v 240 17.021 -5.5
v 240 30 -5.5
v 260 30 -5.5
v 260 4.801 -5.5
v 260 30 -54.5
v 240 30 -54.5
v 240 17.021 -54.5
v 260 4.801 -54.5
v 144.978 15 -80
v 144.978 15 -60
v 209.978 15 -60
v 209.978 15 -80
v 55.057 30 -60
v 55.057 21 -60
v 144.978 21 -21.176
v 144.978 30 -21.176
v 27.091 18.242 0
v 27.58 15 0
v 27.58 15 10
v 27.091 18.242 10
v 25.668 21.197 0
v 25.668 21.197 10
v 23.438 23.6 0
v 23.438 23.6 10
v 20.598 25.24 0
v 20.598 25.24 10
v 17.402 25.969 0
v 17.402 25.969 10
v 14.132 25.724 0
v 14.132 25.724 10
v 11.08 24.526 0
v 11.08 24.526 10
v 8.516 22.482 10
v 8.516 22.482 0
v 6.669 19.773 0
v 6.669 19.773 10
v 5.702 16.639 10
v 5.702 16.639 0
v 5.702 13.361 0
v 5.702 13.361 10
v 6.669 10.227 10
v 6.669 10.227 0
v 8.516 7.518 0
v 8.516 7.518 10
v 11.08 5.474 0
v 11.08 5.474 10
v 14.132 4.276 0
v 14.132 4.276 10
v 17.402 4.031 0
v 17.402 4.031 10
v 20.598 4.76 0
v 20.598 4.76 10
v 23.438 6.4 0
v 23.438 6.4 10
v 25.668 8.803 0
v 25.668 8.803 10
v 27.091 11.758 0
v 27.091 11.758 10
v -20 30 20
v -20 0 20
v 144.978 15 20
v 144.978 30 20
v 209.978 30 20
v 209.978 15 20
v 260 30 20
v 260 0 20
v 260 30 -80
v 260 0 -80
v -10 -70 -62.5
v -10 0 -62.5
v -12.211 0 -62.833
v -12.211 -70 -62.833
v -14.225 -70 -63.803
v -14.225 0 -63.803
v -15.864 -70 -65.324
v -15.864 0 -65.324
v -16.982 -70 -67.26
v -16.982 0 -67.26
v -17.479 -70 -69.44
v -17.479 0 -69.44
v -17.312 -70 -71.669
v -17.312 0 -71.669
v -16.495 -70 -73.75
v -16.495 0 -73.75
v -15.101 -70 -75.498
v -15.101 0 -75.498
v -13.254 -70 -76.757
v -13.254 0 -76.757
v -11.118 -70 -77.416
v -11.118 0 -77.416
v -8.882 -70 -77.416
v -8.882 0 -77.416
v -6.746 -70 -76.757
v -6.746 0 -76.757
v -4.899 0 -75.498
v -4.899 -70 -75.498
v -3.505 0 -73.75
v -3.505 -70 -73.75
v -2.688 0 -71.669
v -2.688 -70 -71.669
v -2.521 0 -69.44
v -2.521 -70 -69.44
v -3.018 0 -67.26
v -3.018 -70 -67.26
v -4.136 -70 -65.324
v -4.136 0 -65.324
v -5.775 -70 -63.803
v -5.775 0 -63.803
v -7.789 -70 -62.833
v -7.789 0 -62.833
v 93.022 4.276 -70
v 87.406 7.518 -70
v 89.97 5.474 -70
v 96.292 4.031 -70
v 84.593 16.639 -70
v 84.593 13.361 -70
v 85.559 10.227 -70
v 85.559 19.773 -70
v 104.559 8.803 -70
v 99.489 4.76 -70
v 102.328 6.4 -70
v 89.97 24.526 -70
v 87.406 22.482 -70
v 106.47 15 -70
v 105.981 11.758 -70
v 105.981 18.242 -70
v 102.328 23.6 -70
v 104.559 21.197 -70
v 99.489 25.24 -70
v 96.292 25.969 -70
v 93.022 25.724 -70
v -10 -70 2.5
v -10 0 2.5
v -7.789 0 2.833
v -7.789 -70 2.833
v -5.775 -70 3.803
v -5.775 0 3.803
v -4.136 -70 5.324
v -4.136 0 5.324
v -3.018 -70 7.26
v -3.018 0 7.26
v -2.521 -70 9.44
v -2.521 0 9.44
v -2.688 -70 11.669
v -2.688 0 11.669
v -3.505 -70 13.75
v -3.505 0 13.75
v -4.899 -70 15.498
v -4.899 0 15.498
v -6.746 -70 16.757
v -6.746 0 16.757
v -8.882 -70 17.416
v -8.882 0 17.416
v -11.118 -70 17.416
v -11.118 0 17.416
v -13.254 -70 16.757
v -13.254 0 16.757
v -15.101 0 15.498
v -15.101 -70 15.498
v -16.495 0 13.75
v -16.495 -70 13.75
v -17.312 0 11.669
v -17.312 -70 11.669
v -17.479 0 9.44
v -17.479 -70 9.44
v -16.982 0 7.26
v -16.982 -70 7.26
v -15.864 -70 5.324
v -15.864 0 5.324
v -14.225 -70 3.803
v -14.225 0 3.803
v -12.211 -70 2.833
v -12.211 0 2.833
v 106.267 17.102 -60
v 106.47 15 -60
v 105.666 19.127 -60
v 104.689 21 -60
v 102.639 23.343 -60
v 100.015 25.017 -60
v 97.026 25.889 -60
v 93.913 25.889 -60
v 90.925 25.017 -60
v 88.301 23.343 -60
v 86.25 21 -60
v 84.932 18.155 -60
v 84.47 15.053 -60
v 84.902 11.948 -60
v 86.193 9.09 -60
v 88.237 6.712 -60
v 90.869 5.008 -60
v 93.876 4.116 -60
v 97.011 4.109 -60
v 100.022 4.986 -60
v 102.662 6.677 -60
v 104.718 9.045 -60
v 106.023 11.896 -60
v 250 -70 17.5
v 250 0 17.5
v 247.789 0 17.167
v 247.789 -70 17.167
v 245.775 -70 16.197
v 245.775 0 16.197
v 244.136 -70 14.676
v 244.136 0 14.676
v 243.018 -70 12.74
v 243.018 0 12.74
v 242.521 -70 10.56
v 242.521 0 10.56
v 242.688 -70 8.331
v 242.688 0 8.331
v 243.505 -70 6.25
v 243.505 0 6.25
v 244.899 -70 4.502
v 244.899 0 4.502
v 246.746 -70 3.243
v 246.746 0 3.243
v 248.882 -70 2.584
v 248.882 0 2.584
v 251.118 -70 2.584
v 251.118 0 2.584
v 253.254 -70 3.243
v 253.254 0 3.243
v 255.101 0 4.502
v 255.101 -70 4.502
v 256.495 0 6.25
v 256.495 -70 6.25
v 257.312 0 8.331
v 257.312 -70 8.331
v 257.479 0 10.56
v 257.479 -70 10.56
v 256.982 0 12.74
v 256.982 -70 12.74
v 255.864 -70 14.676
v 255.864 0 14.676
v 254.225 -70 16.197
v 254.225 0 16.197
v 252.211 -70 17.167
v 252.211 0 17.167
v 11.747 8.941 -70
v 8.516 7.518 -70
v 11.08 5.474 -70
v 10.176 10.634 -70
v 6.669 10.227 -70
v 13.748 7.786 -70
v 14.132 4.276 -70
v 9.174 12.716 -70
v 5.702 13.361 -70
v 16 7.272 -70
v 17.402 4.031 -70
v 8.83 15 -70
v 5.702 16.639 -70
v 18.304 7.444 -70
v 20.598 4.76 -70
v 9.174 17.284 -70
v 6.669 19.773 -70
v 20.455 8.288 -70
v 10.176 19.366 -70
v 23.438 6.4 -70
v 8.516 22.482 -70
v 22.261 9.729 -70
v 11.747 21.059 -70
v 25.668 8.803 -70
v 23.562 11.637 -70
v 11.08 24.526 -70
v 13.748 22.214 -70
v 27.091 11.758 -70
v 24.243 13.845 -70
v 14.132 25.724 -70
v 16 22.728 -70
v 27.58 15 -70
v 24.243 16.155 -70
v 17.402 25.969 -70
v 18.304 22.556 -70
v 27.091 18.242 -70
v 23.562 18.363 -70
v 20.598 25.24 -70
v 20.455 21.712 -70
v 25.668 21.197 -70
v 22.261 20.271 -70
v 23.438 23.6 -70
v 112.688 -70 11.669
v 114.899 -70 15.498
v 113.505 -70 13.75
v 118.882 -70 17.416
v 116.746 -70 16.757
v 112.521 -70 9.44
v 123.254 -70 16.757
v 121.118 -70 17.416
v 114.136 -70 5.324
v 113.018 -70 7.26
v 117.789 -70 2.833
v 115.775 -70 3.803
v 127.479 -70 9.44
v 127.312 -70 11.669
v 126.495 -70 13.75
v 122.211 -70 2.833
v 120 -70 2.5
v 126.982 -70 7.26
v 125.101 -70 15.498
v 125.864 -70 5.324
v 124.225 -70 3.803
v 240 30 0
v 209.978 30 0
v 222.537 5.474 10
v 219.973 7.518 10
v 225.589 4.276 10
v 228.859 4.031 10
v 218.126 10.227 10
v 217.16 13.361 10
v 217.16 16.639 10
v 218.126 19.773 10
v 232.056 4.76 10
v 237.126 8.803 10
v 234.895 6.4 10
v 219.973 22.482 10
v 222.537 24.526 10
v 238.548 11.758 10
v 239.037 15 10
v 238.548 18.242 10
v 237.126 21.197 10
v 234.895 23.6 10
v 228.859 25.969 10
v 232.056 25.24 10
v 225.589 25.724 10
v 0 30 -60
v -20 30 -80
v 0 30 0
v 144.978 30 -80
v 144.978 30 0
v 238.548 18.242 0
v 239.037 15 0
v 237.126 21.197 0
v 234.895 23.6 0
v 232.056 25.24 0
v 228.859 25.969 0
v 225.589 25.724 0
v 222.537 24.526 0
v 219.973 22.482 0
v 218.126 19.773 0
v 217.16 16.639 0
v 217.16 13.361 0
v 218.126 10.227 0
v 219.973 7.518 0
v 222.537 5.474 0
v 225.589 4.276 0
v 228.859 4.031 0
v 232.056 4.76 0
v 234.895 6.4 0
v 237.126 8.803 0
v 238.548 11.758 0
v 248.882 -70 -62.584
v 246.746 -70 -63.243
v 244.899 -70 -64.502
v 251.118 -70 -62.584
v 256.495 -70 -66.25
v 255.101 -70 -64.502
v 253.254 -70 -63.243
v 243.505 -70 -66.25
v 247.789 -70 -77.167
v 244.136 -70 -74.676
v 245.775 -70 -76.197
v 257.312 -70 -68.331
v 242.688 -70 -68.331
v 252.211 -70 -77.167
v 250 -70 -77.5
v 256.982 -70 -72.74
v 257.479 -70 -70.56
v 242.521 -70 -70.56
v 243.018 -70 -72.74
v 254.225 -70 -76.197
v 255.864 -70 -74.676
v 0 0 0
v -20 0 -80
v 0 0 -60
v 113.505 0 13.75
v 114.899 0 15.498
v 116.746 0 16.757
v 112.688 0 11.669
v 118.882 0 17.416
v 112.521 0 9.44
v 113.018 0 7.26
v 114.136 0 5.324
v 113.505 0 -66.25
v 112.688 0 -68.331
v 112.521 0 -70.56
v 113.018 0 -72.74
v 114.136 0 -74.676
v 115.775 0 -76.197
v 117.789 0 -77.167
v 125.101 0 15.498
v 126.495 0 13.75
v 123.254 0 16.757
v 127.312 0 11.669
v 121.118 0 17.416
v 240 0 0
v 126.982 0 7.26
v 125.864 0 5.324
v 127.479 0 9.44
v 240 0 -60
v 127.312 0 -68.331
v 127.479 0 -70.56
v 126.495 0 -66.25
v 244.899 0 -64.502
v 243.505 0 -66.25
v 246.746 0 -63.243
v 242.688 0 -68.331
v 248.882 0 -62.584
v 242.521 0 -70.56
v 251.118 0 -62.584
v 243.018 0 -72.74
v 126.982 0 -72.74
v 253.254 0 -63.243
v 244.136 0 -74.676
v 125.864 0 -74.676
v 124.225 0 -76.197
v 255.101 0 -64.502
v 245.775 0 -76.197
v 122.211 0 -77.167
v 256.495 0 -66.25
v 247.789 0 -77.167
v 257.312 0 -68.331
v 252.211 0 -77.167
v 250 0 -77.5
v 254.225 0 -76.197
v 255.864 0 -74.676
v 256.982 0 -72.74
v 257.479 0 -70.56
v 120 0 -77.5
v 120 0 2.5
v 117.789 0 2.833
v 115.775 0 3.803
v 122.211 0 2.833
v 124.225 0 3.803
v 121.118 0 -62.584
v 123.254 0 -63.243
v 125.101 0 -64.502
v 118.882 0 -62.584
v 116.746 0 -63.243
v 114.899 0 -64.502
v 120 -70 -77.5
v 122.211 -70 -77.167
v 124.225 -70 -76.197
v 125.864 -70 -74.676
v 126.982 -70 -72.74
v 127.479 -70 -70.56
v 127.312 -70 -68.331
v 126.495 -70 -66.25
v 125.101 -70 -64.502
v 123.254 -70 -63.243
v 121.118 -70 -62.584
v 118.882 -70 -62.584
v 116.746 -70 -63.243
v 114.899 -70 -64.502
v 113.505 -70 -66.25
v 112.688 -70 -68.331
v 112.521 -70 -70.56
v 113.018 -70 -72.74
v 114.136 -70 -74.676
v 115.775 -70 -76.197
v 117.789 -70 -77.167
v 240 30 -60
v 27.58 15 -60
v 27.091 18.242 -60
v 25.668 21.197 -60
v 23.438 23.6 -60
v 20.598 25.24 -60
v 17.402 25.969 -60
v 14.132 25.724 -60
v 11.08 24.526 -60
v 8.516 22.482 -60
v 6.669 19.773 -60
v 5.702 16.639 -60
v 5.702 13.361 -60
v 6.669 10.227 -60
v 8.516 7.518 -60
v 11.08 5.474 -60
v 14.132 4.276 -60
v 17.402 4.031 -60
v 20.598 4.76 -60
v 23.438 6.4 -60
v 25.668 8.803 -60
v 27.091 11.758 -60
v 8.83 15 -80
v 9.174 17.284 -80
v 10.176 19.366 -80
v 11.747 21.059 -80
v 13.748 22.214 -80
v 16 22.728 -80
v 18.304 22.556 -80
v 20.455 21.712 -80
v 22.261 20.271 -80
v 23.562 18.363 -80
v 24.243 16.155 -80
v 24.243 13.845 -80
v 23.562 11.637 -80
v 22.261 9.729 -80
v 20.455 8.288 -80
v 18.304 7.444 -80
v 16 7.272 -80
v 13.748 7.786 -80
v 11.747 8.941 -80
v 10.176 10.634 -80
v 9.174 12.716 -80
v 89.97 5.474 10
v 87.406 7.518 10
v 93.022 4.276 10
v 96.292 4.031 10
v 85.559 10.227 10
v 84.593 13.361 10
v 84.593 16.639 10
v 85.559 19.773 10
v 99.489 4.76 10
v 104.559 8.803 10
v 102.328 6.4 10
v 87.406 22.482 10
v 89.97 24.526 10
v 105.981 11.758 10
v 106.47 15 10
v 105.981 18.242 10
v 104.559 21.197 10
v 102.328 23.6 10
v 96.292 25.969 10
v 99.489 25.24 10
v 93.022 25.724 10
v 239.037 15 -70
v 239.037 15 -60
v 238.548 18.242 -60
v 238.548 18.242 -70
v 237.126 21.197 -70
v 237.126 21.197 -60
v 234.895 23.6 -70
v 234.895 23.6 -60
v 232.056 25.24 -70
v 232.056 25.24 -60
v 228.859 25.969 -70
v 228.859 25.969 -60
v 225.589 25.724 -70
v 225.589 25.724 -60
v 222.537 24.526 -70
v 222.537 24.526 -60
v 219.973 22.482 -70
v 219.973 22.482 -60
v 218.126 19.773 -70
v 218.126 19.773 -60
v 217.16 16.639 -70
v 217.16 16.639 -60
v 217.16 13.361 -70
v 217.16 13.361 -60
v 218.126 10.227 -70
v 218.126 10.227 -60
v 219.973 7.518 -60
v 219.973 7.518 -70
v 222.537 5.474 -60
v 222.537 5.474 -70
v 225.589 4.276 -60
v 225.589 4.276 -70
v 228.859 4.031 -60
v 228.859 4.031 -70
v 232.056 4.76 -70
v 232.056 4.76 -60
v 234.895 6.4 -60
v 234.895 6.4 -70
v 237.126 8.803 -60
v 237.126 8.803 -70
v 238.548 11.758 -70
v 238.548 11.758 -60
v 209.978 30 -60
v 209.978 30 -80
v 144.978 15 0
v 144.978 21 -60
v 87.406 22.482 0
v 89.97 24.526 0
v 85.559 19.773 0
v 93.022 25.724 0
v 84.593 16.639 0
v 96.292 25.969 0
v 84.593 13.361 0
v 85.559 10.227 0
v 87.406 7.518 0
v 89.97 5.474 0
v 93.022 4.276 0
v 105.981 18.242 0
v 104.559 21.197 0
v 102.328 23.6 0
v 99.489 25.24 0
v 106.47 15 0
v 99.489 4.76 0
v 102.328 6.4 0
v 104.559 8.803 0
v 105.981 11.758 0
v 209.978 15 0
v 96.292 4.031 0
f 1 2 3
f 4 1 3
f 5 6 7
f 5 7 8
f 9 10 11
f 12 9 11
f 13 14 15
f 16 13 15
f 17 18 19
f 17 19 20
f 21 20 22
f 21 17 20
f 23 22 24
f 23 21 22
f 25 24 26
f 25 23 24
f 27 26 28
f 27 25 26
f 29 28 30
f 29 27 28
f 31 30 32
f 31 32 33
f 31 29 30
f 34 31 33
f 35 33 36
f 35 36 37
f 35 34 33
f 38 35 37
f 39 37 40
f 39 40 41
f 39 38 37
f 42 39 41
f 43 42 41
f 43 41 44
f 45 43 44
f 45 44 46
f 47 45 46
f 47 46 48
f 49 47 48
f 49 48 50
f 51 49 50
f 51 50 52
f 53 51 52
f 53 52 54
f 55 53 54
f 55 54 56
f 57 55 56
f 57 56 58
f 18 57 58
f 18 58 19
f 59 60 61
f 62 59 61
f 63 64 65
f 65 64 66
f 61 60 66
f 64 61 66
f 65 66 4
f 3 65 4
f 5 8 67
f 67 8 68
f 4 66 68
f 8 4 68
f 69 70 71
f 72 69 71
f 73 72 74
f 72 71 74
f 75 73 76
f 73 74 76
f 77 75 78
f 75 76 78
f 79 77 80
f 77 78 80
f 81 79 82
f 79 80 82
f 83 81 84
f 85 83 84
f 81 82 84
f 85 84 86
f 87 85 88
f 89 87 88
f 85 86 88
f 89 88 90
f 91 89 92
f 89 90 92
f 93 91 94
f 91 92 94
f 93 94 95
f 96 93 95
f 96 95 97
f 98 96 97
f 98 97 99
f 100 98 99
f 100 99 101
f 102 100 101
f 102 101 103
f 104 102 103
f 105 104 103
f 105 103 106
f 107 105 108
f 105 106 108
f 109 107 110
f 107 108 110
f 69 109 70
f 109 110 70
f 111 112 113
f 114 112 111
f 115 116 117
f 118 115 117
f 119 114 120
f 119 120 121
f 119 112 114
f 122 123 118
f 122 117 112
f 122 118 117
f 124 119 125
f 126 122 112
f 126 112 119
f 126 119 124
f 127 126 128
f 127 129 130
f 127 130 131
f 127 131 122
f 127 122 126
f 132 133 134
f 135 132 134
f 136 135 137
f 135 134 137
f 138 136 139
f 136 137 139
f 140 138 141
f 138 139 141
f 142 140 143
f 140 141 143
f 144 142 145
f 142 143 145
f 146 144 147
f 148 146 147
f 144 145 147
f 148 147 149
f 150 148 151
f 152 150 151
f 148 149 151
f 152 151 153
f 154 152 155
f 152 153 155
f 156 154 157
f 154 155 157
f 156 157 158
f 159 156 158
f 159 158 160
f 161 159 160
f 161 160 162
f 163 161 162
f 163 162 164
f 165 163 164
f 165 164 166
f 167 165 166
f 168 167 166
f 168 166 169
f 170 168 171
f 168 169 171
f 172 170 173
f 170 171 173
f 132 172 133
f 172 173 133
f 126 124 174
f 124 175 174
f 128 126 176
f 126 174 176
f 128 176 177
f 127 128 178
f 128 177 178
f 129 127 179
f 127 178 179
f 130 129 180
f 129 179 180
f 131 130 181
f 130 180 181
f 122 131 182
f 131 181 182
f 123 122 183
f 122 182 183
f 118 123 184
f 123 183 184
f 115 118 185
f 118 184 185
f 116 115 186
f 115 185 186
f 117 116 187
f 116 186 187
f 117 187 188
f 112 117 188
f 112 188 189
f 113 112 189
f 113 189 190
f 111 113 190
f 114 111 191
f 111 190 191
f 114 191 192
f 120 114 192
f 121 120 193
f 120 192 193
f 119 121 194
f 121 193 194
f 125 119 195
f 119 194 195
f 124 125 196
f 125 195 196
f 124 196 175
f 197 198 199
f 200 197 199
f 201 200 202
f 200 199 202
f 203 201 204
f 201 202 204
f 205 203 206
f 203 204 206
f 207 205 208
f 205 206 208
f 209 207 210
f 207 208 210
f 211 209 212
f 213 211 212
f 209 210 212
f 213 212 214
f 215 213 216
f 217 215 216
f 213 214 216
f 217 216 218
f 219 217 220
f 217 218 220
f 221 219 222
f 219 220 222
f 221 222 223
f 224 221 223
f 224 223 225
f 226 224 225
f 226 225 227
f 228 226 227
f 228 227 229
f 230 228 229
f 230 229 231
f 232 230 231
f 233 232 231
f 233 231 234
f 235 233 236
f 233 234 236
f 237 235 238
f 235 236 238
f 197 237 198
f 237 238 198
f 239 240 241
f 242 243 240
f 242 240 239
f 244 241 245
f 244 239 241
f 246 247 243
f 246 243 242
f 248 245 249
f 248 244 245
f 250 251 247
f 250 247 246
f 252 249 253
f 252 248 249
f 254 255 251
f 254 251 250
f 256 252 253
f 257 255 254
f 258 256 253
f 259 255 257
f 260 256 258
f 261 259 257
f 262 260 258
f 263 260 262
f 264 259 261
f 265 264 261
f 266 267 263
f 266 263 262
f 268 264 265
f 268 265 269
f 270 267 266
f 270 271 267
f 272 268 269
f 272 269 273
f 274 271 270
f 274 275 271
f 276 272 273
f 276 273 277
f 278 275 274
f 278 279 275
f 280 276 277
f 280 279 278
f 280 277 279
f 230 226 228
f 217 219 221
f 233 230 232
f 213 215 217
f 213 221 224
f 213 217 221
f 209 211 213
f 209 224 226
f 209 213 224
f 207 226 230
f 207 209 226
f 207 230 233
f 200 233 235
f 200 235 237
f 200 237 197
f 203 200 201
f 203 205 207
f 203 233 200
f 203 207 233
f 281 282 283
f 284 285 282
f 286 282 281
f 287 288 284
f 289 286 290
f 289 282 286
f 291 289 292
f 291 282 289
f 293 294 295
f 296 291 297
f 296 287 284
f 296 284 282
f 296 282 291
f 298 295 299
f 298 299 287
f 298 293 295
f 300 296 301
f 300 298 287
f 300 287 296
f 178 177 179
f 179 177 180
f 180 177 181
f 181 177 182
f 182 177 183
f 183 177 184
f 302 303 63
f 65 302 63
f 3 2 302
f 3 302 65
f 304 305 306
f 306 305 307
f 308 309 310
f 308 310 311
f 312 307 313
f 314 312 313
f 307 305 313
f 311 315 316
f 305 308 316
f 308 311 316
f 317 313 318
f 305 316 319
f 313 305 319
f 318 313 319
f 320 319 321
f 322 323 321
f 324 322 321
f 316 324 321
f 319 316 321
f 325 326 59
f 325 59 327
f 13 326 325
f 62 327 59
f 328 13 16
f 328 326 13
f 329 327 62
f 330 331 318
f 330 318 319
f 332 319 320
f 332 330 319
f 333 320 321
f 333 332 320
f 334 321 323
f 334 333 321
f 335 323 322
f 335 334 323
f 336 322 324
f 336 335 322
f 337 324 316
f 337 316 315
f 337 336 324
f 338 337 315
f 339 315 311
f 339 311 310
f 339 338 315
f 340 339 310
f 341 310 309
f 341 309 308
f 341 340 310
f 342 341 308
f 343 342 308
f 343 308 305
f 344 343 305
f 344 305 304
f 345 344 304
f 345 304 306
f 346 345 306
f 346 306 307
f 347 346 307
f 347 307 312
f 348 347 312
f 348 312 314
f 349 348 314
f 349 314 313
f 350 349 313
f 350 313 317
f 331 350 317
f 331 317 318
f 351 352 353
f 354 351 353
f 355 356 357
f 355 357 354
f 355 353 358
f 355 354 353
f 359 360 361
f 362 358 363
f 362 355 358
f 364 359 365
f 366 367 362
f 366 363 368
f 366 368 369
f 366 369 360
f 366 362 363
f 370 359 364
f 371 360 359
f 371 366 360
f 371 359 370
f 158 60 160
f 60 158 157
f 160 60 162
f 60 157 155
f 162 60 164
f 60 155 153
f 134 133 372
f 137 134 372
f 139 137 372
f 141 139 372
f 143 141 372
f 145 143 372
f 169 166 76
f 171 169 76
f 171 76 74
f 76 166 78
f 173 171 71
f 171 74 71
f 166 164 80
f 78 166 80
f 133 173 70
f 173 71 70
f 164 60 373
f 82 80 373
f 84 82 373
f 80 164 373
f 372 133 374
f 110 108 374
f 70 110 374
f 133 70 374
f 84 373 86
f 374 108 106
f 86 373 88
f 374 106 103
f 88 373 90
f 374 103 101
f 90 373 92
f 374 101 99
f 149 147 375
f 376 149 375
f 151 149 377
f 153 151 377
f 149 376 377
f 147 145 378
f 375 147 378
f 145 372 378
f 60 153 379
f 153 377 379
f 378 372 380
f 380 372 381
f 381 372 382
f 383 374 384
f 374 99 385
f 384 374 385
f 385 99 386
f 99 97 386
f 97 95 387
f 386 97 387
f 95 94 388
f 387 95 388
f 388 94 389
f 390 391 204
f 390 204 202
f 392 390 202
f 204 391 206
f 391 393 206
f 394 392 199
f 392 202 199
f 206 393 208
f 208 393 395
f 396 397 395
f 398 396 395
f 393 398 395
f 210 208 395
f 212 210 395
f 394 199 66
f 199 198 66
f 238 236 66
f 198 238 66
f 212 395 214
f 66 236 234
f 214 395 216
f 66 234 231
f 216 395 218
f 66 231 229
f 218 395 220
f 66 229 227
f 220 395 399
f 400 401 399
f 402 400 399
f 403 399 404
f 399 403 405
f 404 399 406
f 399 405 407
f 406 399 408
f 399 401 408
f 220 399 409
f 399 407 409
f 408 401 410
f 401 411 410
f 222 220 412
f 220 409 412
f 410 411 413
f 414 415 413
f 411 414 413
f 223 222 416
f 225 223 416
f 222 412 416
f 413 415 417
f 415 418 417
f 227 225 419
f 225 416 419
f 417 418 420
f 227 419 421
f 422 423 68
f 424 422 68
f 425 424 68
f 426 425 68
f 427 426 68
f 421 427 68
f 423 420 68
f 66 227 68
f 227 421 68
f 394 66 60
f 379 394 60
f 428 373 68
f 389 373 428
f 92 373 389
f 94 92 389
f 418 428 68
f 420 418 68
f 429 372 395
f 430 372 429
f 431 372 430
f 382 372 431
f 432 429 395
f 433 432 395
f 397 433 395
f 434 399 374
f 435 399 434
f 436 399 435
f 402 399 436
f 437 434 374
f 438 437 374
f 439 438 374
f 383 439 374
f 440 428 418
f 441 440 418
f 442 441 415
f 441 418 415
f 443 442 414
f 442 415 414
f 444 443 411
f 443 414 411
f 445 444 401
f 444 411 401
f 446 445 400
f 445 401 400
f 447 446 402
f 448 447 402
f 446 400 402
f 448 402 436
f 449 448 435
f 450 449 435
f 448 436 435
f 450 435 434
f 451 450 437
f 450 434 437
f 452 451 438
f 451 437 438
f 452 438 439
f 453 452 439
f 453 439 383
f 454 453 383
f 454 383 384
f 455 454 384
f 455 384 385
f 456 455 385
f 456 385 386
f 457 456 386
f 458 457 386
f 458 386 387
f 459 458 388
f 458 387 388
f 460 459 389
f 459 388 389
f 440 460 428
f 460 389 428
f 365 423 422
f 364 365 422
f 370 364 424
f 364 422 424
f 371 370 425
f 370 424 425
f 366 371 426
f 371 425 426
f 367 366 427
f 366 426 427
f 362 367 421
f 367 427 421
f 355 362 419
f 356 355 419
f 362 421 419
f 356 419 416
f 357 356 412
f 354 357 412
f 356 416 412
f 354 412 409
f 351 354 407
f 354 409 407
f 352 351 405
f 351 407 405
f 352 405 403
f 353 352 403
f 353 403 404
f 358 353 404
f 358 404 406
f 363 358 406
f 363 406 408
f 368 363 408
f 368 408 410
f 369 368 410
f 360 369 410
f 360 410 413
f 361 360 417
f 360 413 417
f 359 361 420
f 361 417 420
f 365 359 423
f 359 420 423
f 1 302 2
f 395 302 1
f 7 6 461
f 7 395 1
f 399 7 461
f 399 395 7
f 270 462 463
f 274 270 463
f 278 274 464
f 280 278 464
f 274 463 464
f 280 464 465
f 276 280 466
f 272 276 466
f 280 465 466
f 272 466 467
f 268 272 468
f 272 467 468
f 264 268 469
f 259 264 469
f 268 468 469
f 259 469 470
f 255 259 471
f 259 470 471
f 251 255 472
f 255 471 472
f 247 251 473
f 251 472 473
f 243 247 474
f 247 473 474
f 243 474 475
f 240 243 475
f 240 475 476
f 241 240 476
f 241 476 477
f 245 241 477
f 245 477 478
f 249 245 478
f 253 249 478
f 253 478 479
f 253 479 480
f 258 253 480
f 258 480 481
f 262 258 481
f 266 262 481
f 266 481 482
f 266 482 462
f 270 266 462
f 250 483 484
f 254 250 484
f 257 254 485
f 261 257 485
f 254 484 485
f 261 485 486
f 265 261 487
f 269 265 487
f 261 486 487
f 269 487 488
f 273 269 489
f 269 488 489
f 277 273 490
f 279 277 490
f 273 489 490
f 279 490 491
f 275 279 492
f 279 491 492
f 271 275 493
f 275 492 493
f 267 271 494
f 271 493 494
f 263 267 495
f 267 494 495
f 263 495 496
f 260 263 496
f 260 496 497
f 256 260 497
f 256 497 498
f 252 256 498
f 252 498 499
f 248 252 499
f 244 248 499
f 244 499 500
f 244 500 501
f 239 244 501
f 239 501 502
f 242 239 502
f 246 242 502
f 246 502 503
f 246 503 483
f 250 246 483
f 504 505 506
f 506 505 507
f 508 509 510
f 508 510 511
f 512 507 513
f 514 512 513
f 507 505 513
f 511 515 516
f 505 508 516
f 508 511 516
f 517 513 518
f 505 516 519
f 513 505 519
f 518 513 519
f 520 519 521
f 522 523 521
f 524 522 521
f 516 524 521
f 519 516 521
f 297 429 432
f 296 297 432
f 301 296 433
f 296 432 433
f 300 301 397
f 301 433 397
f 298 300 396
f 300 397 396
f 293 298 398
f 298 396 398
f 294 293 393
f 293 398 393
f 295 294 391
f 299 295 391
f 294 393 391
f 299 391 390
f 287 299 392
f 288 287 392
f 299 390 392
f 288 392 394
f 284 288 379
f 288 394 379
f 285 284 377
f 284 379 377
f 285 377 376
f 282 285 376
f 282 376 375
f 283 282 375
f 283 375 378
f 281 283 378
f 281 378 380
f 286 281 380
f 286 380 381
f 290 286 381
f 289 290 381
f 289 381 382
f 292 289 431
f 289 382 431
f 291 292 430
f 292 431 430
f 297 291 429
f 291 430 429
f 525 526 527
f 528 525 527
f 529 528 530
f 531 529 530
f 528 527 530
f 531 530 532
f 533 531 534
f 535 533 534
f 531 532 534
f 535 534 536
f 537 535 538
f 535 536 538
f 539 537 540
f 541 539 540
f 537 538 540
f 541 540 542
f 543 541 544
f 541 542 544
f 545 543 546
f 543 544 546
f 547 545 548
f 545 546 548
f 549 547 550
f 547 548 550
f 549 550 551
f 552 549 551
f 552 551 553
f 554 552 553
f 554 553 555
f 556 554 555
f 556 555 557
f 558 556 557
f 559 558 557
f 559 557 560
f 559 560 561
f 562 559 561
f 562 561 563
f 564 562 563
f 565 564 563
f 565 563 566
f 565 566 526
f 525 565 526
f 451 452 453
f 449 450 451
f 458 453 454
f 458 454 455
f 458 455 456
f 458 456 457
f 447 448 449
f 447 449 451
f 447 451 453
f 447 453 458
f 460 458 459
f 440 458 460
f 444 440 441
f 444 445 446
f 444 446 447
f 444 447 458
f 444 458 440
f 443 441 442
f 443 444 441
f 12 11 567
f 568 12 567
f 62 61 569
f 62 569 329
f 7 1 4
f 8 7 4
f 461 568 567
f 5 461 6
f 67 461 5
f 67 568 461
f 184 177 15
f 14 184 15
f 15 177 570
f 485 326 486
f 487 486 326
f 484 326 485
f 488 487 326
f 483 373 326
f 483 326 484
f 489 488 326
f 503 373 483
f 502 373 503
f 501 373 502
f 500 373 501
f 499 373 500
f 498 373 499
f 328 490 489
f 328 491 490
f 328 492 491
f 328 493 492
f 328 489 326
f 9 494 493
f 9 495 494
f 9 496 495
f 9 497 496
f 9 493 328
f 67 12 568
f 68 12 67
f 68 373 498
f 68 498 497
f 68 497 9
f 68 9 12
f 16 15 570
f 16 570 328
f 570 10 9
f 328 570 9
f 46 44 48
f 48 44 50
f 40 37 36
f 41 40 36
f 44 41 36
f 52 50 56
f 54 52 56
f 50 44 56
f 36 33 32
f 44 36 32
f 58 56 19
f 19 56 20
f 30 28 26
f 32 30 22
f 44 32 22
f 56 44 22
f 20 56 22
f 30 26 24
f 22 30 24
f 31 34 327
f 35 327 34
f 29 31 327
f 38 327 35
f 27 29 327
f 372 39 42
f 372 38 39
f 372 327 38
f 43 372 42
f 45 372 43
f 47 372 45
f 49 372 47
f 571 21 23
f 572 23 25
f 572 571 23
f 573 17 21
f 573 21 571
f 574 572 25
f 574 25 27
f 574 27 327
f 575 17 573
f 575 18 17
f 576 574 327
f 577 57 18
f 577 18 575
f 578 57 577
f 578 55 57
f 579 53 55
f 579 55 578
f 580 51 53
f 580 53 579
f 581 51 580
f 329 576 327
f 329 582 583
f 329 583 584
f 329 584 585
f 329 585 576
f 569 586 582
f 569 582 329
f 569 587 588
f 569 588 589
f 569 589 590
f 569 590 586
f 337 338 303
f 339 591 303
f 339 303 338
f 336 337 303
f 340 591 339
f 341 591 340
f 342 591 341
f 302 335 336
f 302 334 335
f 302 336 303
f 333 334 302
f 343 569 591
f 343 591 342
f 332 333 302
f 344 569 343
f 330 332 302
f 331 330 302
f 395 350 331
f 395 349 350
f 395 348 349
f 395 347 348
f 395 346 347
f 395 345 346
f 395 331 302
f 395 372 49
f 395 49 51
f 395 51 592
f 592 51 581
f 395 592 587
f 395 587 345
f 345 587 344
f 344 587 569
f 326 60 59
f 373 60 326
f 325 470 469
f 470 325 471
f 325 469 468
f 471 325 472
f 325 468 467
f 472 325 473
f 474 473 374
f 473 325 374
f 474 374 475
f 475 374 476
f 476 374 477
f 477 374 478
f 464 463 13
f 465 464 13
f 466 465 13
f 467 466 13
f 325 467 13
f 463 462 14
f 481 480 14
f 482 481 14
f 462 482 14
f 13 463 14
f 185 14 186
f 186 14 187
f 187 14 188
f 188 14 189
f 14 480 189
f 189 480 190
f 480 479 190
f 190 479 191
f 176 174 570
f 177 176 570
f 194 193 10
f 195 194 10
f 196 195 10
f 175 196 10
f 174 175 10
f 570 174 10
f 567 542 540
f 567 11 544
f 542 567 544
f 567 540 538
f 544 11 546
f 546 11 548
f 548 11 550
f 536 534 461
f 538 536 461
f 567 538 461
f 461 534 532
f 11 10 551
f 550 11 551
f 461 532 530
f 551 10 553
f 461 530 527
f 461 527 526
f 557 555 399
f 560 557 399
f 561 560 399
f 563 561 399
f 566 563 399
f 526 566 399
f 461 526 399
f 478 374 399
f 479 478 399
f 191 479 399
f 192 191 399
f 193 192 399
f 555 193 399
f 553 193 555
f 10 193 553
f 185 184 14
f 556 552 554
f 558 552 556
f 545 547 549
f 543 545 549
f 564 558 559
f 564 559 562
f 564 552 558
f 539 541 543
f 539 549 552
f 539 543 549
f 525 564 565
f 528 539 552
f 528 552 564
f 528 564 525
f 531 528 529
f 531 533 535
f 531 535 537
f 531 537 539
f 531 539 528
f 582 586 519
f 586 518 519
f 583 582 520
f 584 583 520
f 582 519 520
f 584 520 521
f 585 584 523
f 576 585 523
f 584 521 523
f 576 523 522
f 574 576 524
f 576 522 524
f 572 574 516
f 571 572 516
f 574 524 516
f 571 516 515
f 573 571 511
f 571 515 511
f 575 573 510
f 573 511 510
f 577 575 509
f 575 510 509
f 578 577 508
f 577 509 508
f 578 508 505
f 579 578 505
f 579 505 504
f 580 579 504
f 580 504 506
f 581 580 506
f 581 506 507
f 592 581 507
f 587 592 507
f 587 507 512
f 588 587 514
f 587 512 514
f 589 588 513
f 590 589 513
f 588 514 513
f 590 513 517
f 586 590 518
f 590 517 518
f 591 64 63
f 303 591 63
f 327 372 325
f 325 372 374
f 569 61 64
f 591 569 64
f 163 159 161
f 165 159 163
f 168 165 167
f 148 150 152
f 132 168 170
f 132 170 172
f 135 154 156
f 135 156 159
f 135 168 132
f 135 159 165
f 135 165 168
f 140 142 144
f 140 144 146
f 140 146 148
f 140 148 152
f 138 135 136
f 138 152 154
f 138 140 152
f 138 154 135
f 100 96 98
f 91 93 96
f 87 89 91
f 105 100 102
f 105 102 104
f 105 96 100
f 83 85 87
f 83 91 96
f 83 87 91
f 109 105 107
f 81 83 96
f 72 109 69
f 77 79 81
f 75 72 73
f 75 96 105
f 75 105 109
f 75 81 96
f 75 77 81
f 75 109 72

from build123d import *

# Parameters (mm, degrees)
IZIM1_W                          = 280
IZIM1_H                          = 100
IZIM1_W_2                        = 240
IZIM1_H_2                        = 60
Y_KSEKLIK_EKSTR_ZYON1_DEPTH      = 30
IZIM2_R                          = 7.5
Y_KSEKLIK_EKSTR_ZYON2_DEPTH      = 70
IZIM4_R                          = 11
KES_EKSTR_ZYON1_DEPTH            = 40
IZIM5_W                          = 65
IZIM5_H                          = 15
KES_EKSTR_ZYON2_DEPTH            = 119
KES_EKSTR_ZYON3_DEPTH            = 24.5
Y_KSEKLIK_EKSTR_ZYON4_DEPTH      = 8
Y_KSEKLIK_EKSTR_ZYON4_DEPTH_BACK = 1
IZIM13_R                         = 7.75
KES_EKSTR_ZYON4_DEPTH            = 18


with BuildPart() as part:
    # Çizim1 → Yükseklik-Ekstrüzyon1 (new body)
    with BuildSketch(Plane(origin=(0, 0, 0), x_dir=(1, 0, 0), z_dir=(0, 1, 0))):
        with Locations((120, 30)):
            Rectangle(IZIM1_W, IZIM1_H)
        with Locations((120, 30)):
            Rectangle(IZIM1_W_2, IZIM1_H_2, mode=Mode.SUBTRACT)
    extrude(amount=Y_KSEKLIK_EKSTR_ZYON1_DEPTH)

    # Çizim2 → Yükseklik-Ekstrüzyon2 (add)
    with BuildSketch(Plane(origin=(0, 0, 0), x_dir=(-1, 0, 0), z_dir=(0, -1, 0))):
        with Locations(Location((10, -10, 0), (0, 0, 90))):
            Circle(IZIM2_R)
        with Locations(Location((-250, -10, 0), (0, 0, 270))):
            Circle(IZIM2_R)
        with Locations(Location((10, 70, 0), (0, 0, 270))):
            Circle(IZIM2_R)
        with Locations(Location((-250, 70, 0), (0, 0, 90))):
            Circle(IZIM2_R)
        with Locations(Location((-120, -10, 0), (0, 0, 90))):
            Circle(IZIM2_R)
        with Locations(Location((-120, 70, 0), (0, 0, 90))):
            Circle(IZIM2_R)
    extrude(amount=Y_KSEKLIK_EKSTR_ZYON2_DEPTH)

    # Çizim4 → Kes-Ekstrüzyon1 (cut, symmetric)
    with BuildSketch(Plane.XY.offset(-30)):
        with Locations((228.036930768, 15)):
            Circle(IZIM4_R)
        with Locations((16.579541137, 15)):
            Circle(IZIM4_R)
        with Locations((95.469880506, 15)):
            Circle(IZIM4_R)
    extrude(amount=KES_EKSTR_ZYON1_DEPTH, both=True, mode=Mode.SUBTRACT)

    # Çizim5 → Kes-Ekstrüzyon2 (cut)
    with BuildSketch(Plane.XY.offset(20)):
        with Locations((177.478221097, 22.5)):
            Rectangle(IZIM5_W, IZIM5_H)
    extrude(amount=-KES_EKSTR_ZYON2_DEPTH, mode=Mode.SUBTRACT)

    # Çizim6 → Kes-Ekstrüzyon3 (cut, symmetric)
    with BuildSketch(Plane.XY.offset(-30)):
        Polygon((260, 31.552276972), (234.133246527, 31.552276972), (234.359911555, 20.467639669), (260, 4.801073138), align=None)
    extrude(amount=KES_EKSTR_ZYON3_DEPTH, both=True, mode=Mode.SUBTRACT)

    # Çizim10 → Yükseklik-Ekstrüzyon4 (add, two sides: drawn at the far end of the back side and taken through both)
    with BuildSketch(Plane(origin=(0, 22, 0), x_dir=(1, 0, 0), z_dir=(0, 1, 0)).offset(-Y_KSEKLIK_EKSTR_ZYON4_DEPTH_BACK)):
        Polygon((55.057032044, 60), (144.978221097, 21.175943648), (144.978221097, 60), align=None)
    extrude(amount=Y_KSEKLIK_EKSTR_ZYON4_DEPTH + Y_KSEKLIK_EKSTR_ZYON4_DEPTH_BACK)

    # Çizim13 → Kes-Ekstrüzyon4 (cut)
    with BuildSketch(Plane(origin=(0, 0, -80), x_dir=(-1, 0, 0), z_dir=(0, 0, -1))):
        with Locations((-16.579541137, 15)):
            Circle(IZIM13_R)
    extrude(amount=-KES_EKSTR_ZYON4_DEPTH, mode=Mode.SUBTRACT)


solid = part.part
